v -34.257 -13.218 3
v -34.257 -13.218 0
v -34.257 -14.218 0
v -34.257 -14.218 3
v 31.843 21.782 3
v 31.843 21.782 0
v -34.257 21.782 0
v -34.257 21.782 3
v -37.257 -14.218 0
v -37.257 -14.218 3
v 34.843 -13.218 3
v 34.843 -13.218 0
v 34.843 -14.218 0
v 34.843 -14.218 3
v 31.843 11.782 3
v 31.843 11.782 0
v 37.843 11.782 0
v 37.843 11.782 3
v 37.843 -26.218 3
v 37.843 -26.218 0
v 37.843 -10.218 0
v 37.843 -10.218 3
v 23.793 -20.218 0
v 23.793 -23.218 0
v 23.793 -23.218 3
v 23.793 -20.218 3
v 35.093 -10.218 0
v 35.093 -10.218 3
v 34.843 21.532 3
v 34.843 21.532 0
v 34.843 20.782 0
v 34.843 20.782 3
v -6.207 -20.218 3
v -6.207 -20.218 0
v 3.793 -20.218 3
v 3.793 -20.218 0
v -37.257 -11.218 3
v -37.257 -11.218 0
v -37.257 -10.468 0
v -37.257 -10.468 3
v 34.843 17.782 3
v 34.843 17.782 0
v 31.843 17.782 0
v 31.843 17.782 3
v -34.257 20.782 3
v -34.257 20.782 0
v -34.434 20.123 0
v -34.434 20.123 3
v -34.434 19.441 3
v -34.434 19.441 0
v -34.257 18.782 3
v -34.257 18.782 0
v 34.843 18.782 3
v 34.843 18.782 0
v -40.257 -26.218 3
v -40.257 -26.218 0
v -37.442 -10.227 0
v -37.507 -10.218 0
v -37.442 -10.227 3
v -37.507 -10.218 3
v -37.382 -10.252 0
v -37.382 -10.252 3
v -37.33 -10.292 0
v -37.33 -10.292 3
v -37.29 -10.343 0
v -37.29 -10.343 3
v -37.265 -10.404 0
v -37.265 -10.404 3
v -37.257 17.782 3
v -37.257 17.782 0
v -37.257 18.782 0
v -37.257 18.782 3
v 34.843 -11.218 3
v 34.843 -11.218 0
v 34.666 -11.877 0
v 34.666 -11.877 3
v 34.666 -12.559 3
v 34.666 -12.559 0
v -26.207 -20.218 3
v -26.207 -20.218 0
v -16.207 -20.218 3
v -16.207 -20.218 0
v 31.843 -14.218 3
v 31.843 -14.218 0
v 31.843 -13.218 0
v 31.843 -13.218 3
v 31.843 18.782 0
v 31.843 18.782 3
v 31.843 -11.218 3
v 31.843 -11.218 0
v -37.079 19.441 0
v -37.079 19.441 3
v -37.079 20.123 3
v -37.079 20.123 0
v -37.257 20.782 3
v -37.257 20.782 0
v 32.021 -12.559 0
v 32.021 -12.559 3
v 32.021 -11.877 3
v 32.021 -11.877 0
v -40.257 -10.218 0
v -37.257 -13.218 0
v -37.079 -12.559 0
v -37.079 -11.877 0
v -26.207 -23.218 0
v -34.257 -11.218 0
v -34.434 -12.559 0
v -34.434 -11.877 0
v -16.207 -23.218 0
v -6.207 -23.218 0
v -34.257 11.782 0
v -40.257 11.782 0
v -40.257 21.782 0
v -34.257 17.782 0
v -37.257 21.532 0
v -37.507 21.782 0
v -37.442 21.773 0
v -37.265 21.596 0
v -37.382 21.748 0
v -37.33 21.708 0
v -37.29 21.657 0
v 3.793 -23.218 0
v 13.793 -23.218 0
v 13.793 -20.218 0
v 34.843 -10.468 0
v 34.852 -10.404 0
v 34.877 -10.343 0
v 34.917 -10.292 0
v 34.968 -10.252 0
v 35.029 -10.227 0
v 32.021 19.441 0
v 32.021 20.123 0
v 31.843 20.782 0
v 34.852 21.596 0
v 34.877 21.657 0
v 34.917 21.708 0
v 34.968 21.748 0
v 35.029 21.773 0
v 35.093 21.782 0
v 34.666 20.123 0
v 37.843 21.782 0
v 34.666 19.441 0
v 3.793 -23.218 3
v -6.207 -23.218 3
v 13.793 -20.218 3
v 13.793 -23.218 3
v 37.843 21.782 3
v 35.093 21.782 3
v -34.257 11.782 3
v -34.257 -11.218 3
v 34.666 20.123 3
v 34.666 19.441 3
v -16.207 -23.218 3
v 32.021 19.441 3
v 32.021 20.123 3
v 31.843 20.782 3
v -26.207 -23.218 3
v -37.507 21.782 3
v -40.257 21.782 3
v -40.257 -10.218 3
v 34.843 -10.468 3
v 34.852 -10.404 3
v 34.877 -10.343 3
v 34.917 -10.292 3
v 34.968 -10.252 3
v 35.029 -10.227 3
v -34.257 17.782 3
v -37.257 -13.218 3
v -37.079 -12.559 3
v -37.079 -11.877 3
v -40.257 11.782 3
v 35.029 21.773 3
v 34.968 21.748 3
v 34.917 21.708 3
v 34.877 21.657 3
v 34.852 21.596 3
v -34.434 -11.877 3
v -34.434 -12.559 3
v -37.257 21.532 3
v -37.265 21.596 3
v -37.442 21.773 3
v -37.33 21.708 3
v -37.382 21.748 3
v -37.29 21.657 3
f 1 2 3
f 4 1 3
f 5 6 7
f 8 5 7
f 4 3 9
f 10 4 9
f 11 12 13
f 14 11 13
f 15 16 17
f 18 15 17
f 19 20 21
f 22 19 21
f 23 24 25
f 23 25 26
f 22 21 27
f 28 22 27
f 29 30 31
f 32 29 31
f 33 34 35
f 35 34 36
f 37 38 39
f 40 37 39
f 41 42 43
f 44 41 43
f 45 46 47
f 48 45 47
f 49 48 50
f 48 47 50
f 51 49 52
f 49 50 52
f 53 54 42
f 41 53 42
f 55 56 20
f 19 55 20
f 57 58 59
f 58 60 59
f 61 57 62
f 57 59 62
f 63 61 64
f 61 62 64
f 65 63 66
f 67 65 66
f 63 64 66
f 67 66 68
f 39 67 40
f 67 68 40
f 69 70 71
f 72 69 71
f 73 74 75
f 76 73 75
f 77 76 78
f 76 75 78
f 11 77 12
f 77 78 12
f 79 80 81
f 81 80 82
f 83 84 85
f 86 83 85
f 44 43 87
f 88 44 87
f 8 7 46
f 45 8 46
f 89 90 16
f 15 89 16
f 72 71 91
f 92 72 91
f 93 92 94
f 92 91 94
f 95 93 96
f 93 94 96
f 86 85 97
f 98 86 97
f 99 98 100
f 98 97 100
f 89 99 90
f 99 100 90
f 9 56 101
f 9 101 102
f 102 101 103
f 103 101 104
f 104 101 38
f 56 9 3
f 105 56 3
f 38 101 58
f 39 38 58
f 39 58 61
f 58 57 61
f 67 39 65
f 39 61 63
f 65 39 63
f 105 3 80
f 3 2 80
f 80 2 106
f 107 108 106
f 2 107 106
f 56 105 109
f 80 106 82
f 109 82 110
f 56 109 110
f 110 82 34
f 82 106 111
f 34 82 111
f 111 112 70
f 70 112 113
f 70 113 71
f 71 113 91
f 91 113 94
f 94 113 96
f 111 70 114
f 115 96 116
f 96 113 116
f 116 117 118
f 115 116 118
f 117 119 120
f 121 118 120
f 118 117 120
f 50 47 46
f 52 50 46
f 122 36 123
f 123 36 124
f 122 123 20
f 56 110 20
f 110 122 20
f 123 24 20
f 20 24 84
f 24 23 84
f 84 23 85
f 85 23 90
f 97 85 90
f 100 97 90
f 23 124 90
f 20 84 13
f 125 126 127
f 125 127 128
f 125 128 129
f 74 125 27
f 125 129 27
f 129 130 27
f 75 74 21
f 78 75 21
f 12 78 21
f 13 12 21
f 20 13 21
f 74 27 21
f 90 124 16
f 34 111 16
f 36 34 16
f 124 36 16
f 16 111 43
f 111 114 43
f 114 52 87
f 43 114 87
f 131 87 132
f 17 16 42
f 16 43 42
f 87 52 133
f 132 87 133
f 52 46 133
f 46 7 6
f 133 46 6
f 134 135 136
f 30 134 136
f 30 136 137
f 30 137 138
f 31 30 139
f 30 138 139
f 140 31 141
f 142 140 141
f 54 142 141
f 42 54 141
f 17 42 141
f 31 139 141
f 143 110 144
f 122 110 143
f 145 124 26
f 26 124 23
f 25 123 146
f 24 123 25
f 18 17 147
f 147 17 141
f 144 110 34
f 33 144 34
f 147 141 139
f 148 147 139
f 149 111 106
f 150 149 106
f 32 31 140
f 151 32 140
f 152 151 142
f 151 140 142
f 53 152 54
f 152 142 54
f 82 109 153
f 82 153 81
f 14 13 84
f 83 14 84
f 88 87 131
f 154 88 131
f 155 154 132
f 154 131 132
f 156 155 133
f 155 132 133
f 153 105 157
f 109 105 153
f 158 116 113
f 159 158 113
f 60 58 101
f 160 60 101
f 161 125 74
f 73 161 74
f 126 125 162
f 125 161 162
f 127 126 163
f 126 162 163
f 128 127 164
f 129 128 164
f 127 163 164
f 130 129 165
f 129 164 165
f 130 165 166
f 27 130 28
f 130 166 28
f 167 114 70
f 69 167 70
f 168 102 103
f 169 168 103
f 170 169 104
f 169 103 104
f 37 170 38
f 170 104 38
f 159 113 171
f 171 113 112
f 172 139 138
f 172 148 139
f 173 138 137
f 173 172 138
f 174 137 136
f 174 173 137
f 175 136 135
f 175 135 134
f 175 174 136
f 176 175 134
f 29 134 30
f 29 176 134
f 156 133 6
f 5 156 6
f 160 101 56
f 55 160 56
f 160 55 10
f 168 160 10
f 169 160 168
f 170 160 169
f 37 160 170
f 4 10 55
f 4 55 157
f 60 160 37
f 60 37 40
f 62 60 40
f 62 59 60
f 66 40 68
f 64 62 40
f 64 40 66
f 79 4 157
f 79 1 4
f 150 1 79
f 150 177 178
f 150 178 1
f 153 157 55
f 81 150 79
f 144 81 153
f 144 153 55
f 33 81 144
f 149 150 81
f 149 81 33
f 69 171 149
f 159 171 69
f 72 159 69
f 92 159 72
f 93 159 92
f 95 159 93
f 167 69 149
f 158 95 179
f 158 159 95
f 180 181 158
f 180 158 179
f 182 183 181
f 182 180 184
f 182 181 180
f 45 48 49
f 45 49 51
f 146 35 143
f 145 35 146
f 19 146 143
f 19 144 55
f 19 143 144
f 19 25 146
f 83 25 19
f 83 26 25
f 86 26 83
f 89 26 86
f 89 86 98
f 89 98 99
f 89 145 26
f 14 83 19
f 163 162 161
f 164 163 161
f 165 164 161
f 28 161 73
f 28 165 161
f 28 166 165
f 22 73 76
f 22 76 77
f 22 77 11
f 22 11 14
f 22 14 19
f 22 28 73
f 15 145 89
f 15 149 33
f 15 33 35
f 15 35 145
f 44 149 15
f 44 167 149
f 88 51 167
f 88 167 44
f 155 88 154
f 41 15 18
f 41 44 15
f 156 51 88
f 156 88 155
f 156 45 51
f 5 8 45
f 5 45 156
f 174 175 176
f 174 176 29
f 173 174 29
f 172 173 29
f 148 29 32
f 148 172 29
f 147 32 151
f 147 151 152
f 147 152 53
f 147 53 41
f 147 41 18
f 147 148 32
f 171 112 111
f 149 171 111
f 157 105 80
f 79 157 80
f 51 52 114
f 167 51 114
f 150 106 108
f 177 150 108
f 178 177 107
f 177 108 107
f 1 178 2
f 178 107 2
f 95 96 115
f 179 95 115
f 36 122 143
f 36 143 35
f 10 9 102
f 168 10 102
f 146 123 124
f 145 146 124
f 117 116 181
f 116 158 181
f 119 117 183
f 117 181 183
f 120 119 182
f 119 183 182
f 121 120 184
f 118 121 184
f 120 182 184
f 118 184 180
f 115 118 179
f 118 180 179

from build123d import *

# Parameters (mm, degrees)
SKETCH1_W           = 10
SKETCH1_H           = 3
BOSS_EXTRUDE1_DEPTH = 3
FILLET1_R           = 0.25


with BuildPart() as part:
    # Sketch1 → Boss-Extrude1 (new body)
    with BuildSketch(Plane.XY):
        with BuildLine():
            Line((34.843392212, -14.218278754), (31.843392212, -14.218278754))
            Line((31.843392212, -14.218278754), (31.843392212, -13.218278754))
            ThreePointArc((31.843392212, -13.218278754), (32.043392212, -12.218278754), (31.843392212, -11.218278754))
            Line((31.843392212, -11.218278754), (31.843392212, 11.781721246))
            Line((31.843392212, 11.781721246), (37.843392212, 11.781721246))
            Line((37.843392212, 11.781721246), (37.843392212, 21.781721246))
            Line((37.843392212, 21.781721246), (34.843392212, 21.781721246))
            Line((34.843392212, 21.781721246), (34.843392212, 20.781721246))
            ThreePointArc((34.843392212, 20.781721246), (34.643392212, 19.781721246), (34.843392212, 18.781721246))
            Line((34.843392212, 18.781721246), (34.843392212, 17.781721246))
            Line((34.843392212, 17.781721246), (31.843392212, 17.781721246))
            Line((31.843392212, 17.781721246), (31.843392212, 18.781721246))
            ThreePointArc((31.843392212, 18.781721246), (32.043392212, 19.781721246), (31.843392212, 20.781721246))
            Line((31.843392212, 20.781721246), (31.843392212, 21.781721246))
            Line((31.843392212, 21.781721246), (-34.256607788, 21.781721246))
            Line((-34.256607788, 21.781721246), (-34.256607788, 20.781721246))
            ThreePointArc((-34.256607788, 20.781721246), (-34.456607788, 19.781721246), (-34.256607788, 18.781721246))
            Line((-34.256607788, 18.781721246), (-34.256607788, 17.781721246))
            Line((-34.256607788, 17.781721246), (-37.256607788, 17.781721246))
            Line((-37.256607788, 17.781721246), (-37.256607788, 18.781721246))
            ThreePointArc((-37.256607788, 18.781721246), (-37.056607788, 19.781721246), (-37.256607788, 20.781721246))
            Line((-37.256607788, 20.781721246), (-37.256607788, 21.781721246))
            Line((-37.256607788, 21.781721246), (-40.256607788, 21.781721246))
            Line((-40.256607788, 21.781721246), (-40.256607788, 11.781721246))
            Line((-40.256607788, 11.781721246), (-34.256607788, 11.781721246))
            Line((-34.256607788, 11.781721246), (-34.256607788, -11.218278754))
            ThreePointArc((-34.256607788, -11.218278754), (-34.456607788, -12.218278754), (-34.256607788, -13.218278754))
            Line((-34.256607788, -13.218278754), (-34.256607788, -14.218278754))
            Line((-34.256607788, -14.218278754), (-37.256607788, -14.218278754))
            Line((-37.256607788, -14.218278754), (-37.256607788, -13.218278754))
            ThreePointArc((-37.256607788, -13.218278754), (-37.056607788, -12.218278754), (-37.256607788, -11.218278754))
            Line((-37.256607788, -11.218278754), (-37.256607788, -10.218278754))
            Line((-37.256607788, -10.218278754), (-40.256607788, -10.218278754))
            Line((-40.256607788, -10.218278754), (-40.256607788, -26.218278754))
            Line((-40.256607788, -26.218278754), (37.843392212, -26.218278754))
            Line((37.843392212, -26.218278754), (37.843392212, -10.218278754))
            Line((37.843392212, -10.218278754), (34.843392212, -10.218278754))
            Line((34.843392212, -10.218278754), (34.843392212, -11.218278754))
            ThreePointArc((34.843392212, -11.218278754), (34.643392212, -12.218278754), (34.843392212, -13.218278754))
            Line((34.843392212, -13.218278754), (34.843392212, -14.218278754))
        make_face()
        with Locations((-1.206607788, -21.718278754)):
            Rectangle(SKETCH1_W, SKETCH1_H, mode=Mode.SUBTRACT)
        with Locations((18.793392212, -21.718278754)):
            Rectangle(SKETCH1_W, SKETCH1_H, mode=Mode.SUBTRACT)
        with Locations((-21.206607788, -21.718278754)):
            Rectangle(SKETCH1_W, SKETCH1_H, mode=Mode.SUBTRACT)
    extrude(amount=BOSS_EXTRUDE1_DEPTH)

    # Fillet1
    fillet1_edges = [part.edges().sort_by_distance(p)[0] for p in [
        (34.843392212, 21.781721246, 1.5),
        (34.843392212, -10.218278754, 1.5),
        (-37.256607788, -10.218278754, 1.5),
        (-37.256607788, 21.781721246, 1.5),
    ]]
    fillet(fillet1_edges, radius=FILLET1_R)


solid = part.part
